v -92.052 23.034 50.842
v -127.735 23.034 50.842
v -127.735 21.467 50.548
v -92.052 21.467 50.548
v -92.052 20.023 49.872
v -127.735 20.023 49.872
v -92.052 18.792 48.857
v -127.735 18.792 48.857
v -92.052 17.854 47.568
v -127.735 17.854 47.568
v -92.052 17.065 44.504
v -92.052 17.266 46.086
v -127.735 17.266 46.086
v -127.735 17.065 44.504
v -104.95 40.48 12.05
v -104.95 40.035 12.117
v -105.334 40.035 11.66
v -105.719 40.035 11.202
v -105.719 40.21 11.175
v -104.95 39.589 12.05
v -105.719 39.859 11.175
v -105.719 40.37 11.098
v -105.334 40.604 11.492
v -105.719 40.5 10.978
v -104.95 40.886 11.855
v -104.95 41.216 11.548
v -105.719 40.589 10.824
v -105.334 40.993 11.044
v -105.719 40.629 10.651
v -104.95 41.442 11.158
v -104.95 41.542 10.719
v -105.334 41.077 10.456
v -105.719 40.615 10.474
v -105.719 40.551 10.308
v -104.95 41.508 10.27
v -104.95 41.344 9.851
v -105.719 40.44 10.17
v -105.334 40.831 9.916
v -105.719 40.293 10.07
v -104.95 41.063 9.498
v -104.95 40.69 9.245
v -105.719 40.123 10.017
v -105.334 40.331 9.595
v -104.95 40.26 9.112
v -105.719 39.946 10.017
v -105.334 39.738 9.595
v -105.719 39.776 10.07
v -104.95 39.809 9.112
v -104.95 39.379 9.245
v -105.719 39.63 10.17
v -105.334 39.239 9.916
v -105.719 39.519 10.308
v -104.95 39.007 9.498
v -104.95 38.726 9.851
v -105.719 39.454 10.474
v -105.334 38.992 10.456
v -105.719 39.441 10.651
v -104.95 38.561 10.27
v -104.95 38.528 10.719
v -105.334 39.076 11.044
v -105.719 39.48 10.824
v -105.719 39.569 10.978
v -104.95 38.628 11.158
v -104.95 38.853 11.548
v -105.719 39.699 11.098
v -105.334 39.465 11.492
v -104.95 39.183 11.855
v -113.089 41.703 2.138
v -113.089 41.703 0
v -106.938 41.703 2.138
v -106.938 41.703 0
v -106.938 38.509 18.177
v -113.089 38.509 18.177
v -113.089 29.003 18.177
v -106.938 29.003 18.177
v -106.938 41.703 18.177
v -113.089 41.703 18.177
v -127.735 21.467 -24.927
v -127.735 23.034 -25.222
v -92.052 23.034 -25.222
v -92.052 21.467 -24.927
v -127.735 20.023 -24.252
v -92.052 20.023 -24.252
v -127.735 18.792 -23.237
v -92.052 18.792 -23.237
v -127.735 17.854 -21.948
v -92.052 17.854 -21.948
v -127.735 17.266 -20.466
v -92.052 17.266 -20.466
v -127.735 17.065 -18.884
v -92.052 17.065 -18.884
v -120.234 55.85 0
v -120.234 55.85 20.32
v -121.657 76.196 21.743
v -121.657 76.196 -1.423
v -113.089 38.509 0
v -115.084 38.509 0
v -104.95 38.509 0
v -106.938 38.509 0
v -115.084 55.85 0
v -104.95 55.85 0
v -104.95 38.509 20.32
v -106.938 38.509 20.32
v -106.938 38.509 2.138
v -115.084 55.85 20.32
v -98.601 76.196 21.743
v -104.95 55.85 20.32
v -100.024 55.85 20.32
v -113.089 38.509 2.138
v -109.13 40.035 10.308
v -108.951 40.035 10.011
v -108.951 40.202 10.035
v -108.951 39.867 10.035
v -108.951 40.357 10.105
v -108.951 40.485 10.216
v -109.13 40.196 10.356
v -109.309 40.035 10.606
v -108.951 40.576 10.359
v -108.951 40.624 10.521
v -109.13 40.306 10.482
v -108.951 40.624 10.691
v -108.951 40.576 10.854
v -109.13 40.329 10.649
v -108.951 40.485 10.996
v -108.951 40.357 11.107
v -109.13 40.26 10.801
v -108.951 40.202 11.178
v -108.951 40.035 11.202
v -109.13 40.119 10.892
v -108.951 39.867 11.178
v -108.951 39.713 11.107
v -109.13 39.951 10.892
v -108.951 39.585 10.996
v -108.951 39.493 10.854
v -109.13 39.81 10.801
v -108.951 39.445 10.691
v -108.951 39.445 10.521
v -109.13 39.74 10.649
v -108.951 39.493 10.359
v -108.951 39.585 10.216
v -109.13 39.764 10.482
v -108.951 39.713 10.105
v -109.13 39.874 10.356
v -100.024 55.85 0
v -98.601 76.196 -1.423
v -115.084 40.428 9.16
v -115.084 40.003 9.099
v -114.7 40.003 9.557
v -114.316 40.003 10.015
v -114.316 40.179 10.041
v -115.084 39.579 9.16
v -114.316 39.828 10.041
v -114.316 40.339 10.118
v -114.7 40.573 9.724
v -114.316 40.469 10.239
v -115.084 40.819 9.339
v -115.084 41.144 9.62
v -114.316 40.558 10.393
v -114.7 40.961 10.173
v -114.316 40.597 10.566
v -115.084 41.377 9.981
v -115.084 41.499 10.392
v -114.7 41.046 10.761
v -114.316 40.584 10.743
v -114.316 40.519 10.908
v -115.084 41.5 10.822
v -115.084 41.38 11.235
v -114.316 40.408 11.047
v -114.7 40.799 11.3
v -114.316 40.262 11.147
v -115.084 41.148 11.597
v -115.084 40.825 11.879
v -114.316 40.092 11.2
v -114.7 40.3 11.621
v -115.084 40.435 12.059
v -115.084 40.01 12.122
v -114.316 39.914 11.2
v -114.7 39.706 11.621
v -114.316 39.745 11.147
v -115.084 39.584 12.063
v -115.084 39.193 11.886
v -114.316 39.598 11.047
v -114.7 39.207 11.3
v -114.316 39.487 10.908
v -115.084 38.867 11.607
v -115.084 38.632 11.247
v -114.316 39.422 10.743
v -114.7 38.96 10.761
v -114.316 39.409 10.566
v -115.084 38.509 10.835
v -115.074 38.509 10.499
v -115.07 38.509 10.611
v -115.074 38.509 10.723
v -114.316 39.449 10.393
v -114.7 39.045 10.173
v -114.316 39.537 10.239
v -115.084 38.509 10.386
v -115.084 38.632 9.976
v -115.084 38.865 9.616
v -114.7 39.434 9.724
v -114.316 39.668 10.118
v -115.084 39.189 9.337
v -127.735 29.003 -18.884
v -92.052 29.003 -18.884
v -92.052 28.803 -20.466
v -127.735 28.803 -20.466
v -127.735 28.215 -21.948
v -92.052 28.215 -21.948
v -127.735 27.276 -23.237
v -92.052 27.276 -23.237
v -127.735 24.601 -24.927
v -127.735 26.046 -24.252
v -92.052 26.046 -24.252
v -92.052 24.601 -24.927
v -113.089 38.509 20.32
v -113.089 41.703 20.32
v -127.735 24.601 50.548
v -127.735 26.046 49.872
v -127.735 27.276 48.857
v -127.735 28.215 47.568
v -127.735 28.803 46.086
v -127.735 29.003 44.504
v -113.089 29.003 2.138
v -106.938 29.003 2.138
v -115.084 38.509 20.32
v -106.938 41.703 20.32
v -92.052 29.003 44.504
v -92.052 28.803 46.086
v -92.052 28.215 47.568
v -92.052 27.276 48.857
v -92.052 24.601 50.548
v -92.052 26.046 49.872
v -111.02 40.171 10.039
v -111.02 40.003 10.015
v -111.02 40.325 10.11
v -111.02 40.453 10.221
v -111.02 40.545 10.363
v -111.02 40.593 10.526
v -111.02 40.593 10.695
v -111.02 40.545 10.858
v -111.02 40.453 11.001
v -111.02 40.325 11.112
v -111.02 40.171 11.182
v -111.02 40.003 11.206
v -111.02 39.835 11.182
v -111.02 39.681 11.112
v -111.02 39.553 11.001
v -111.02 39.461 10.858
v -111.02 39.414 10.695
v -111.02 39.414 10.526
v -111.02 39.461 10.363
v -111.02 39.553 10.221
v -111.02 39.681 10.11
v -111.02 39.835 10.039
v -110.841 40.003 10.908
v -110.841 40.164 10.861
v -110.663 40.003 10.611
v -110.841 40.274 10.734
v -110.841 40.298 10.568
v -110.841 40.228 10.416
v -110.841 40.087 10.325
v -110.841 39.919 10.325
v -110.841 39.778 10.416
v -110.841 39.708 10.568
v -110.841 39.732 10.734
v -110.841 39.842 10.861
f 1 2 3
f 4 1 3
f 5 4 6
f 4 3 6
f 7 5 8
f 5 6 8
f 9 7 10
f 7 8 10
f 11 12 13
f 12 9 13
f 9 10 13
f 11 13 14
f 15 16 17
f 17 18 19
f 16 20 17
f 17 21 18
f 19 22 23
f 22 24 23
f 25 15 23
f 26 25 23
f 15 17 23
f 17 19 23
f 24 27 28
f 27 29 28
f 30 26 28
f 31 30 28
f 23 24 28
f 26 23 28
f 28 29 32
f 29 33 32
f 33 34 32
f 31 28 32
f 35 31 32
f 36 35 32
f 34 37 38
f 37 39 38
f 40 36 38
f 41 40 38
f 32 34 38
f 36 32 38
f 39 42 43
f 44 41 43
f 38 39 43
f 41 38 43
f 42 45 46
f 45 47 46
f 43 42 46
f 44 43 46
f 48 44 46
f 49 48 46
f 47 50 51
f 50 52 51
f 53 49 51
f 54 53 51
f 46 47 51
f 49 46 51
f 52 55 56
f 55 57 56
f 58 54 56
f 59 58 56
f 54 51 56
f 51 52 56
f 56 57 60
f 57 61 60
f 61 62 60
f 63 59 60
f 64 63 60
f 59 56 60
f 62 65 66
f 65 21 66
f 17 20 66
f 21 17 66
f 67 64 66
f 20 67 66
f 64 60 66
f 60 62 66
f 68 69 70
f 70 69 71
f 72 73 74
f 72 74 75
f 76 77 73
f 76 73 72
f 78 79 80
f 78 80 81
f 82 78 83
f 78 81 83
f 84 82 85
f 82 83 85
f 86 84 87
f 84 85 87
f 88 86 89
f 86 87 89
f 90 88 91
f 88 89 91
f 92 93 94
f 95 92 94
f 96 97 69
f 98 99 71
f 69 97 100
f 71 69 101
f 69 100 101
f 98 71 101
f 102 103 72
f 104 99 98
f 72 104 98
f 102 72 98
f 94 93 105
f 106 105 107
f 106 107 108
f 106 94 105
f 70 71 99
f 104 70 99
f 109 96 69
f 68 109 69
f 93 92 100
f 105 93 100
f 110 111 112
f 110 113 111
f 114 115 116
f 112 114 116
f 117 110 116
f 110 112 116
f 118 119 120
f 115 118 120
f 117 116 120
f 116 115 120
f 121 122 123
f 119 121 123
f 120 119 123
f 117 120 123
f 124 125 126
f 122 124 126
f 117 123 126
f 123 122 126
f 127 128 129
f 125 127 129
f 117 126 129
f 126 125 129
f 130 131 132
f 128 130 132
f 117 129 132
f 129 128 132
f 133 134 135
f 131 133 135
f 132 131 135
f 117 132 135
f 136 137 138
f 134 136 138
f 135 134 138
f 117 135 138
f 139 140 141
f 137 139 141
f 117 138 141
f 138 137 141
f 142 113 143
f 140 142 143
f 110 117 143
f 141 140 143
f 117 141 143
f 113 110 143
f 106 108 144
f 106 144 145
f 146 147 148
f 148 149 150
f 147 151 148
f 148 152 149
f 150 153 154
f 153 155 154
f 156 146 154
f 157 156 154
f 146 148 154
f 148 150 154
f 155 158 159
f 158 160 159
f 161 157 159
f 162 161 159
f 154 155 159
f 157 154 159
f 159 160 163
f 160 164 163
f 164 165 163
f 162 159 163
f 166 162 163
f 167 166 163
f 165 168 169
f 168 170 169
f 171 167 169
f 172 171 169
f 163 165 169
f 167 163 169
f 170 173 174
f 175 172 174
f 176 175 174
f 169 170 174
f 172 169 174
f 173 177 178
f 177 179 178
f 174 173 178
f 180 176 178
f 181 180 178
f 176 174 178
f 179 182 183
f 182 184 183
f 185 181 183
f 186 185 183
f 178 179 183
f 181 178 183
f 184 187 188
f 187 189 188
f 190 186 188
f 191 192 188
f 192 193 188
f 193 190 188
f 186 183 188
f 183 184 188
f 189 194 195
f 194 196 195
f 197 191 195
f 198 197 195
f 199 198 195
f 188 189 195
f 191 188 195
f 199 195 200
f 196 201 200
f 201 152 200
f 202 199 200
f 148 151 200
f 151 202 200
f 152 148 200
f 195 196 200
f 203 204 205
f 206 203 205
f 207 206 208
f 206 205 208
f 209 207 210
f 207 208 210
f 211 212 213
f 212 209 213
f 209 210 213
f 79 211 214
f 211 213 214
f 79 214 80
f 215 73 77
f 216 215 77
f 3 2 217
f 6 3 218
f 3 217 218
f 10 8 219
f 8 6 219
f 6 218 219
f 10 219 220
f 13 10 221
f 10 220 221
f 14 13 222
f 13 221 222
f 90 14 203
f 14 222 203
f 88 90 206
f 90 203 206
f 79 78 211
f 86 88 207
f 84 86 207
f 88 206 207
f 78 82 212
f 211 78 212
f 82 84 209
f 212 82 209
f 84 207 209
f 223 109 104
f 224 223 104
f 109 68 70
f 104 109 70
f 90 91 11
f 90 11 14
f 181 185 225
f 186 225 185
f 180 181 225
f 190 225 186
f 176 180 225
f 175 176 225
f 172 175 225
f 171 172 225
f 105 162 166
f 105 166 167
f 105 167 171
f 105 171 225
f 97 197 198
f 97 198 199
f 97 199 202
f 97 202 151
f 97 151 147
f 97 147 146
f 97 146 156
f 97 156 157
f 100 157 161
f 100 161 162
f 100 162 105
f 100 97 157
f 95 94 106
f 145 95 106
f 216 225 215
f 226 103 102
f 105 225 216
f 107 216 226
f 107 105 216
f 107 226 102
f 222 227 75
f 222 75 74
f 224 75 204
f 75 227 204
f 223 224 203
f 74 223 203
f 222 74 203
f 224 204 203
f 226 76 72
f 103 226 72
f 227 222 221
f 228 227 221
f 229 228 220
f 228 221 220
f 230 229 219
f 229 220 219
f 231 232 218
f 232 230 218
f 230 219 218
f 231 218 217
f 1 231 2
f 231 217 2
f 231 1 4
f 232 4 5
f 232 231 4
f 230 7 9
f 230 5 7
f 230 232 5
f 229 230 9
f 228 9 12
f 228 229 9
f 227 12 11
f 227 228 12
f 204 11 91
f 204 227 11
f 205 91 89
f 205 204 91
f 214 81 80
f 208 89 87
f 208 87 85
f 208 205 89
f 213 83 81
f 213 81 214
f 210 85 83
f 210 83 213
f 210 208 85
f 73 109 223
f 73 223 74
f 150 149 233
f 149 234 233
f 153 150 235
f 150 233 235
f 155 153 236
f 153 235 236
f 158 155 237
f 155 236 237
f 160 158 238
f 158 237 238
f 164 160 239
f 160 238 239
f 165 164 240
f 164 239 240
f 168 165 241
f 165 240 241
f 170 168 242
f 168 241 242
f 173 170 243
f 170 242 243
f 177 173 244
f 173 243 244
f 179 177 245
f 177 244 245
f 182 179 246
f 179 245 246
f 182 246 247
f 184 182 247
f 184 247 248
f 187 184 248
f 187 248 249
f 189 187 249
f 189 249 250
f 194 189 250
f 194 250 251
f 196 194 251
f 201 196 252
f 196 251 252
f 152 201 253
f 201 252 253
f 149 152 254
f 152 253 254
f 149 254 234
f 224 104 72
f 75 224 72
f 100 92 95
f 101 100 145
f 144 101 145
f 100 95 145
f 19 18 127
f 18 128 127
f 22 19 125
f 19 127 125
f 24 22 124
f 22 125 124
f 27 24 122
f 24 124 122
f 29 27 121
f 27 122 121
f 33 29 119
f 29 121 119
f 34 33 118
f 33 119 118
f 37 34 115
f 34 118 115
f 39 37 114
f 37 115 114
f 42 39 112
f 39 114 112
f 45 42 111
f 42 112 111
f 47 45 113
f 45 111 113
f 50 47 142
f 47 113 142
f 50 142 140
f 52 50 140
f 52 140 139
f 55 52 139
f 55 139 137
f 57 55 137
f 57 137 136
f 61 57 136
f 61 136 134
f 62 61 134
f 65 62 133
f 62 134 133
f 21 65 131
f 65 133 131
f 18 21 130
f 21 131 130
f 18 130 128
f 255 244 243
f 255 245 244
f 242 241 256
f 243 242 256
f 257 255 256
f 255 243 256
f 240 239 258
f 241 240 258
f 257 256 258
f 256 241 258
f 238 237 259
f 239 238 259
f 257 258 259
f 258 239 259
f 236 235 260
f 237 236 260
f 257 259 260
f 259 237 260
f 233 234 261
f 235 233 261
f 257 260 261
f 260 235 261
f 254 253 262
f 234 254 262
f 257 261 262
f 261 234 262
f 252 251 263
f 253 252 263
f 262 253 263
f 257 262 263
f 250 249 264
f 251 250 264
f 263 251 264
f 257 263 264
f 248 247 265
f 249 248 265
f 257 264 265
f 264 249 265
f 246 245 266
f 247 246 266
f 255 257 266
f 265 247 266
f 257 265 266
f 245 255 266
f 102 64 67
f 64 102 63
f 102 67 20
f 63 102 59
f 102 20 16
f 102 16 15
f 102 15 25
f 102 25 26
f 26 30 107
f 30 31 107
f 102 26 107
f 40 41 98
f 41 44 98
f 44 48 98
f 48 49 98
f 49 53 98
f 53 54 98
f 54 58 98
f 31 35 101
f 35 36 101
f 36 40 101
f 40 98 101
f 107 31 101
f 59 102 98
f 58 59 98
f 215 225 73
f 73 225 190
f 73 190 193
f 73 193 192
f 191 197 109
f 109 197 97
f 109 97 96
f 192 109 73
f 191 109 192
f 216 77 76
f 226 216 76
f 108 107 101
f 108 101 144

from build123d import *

# Parameters (mm, degrees)
SKETCH5_W                       = 20.209666631
SKETCH5_H                       = 20.346218433
BOSS_EXTRUDE3_DEPTH             = 20.32
DRAFT4_ANGLE                    = 4
DRAFT5_ANGLE                    = 4
SKETCH6_W                       = 10.134168445
SKETCH6_H                       = 17.341048708
BOSS_EXTRUDE4_DEPTH             = 20.32
SKETCH7_W                       = 6.151087315
SKETCH7_H                       = 12.30217463
BOSS_EXTRUDE5_DEPTH             = 20.32
CUT_EXTRUDE1_DEPTH              = 20.32
SKETCH9_W                       = 6.151087315
SKETCH9_H                       = 16.039002112
BOSS_EXTRUDE8_DEPTH             = 12.7
F_0_80_TAPPED_HOLE1_D           = 1.19126
F_0_80_TAPPED_HOLE1_DEPTH       = 4.0005
F_0_80_TAPPED_HOLE1_CSINK_D     = 3.0226
F_0_80_TAPPED_HOLE1_CSINK_ANGLE = 100
F_0_80_TAPPED_HOLE1_TIP         = 0.357890611
F_0_80_TAPPED_HOLE3_D           = 1.19126
F_0_80_TAPPED_HOLE3_DEPTH       = 4.064
F_0_80_TAPPED_HOLE3_CSINK_D     = 3.0226
F_0_80_TAPPED_HOLE3_CSINK_ANGLE = 100
F_0_80_TAPPED_HOLE3_TIP         = 0.357890611
SKETCH28_W                      = 35.682781241
SKETCH28_H                      = 76.087494434
BOSS_EXTRUDE13_DEPTH            = 11.938
FILLET5_R                       = 6.35
FILLET6_R                       = 6.35


with BuildPart() as part:
    # Sketch5 → Boss-Extrude3 (new body)
    with BuildSketch(Plane.XY):
        with Locations((-110.129027961, 66.022796056)):
            Rectangle(SKETCH5_W, SKETCH5_H)
    extrude(amount=BOSS_EXTRUDE3_DEPTH)

    # Draft4
    draft4_faces = [part.faces().sort_by_distance(p)[0] for p in [
        (-100.024194645, 66.022796056, 10.16),
        (-120.233861276, 66.022796056, 10.16),
        (-110.129027961, 66.022796056, 20.32),
    ]]
    draft(draft4_faces, Plane(origin=(-120.233861276, 55.849686839, 20.32), x_dir=(0, 0, -1), z_dir=(0, -1, 0)), DRAFT4_ANGLE)

    # Draft5
    draft5_faces = [part.faces().sort_by_distance(p)[0] for p in [
        (-110.129027961, 66.245821761, 0),
    ]]
    draft(draft5_faces, Plane(origin=(-120.233861276, 55.849686839, 20.32), x_dir=(0, 0, -1), z_dir=(0, -1, 0)), DRAFT5_ANGLE)

    # Sketch6 → Boss-Extrude4 (add)
    with BuildSketch(Plane.XY):
        with Locations((-110.017330359, 47.179162485)):
            Rectangle(SKETCH6_W, SKETCH6_H)
    extrude(amount=BOSS_EXTRUDE4_DEPTH)

    # Sketch7 → Boss-Extrude5 (add)
    with BuildSketch(Plane.XY):
        with Locations((-110.013841195, 32.357550816)):
            Rectangle(SKETCH7_W, SKETCH7_H)
    extrude(amount=BOSS_EXTRUDE5_DEPTH)

    # Sketch8 → Cut-Extrude1 (cut)
    with BuildSketch(Plane(origin=(0, 0, 0), x_dir=(-1, 0, 0), z_dir=(0, 0, -1))):
        Polygon((113.089384852, 38.508638131), (113.089384852, 41.703281679), (106.938297537, 41.703281679), (106.938297537, 38.508638131), (106.938297537, 26.206463501), (113.089384852, 26.206463501), align=None)
    extrude(amount=-CUT_EXTRUDE1_DEPTH, mode=Mode.SUBTRACT)

    # Sketch9 → Boss-Extrude8 (add)
    with BuildSketch(Plane.XZ.offset(-41.703281679)):
        with Locations((-110.013841195, 10.15769714)):
            Rectangle(SKETCH9_W, SKETCH9_H)
    extrude(amount=BOSS_EXTRUDE8_DEPTH)

    # #0-80 Tapped Hole1
    with Locations(Plane(origin=(-104.950246136, 0, 0), x_dir=(0, 0, -1), z_dir=(1, 0, 0))):
        with Locations((-10.606199537, 40.03468966)):
            CounterSinkHole(F_0_80_TAPPED_HOLE1_D / 2, F_0_80_TAPPED_HOLE1_CSINK_D / 2, depth=F_0_80_TAPPED_HOLE1_DEPTH, counter_sink_angle=F_0_80_TAPPED_HOLE1_CSINK_ANGLE)
            with Locations((0, 0, -(F_0_80_TAPPED_HOLE1_DEPTH + F_0_80_TAPPED_HOLE1_TIP / 2))):  # 118° drill point
                Cone(0, F_0_80_TAPPED_HOLE1_D / 2, F_0_80_TAPPED_HOLE1_TIP, mode=Mode.SUBTRACT)

    # #0-80 Tapped Hole3
    with Locations(Plane.ZY.offset(115.084414581)):
        with Locations((10.610590501, 40.003135548)):
            CounterSinkHole(F_0_80_TAPPED_HOLE3_D / 2, F_0_80_TAPPED_HOLE3_CSINK_D / 2, depth=F_0_80_TAPPED_HOLE3_DEPTH, counter_sink_angle=F_0_80_TAPPED_HOLE3_CSINK_ANGLE)
            with Locations((0, 0, -(F_0_80_TAPPED_HOLE3_DEPTH + F_0_80_TAPPED_HOLE3_TIP / 2))):  # 118° drill point
                Cone(0, F_0_80_TAPPED_HOLE3_D / 2, F_0_80_TAPPED_HOLE3_TIP, mode=Mode.SUBTRACT)

    # Sketch28 → Boss-Extrude13 (add)
    with BuildSketch(Plane(origin=(0, 29.003281679, 0), x_dir=(-1, 0, 0), z_dir=(0, -1, 0))):
        with Locations((109.89388319, -12.810019293)):
            Rectangle(SKETCH28_W, SKETCH28_H)
    extrude(amount=BOSS_EXTRUDE13_DEPTH)

    # Fillet5
    # the kernel refuses this fillet: 6.35 mm, written as the material it takes off along each edge
    with BuildSketch(Plane(origin=(-76.177492569, 17.065281679, -25.233727924), x_dir=(0, 1, 0), z_dir=(-1, 0, 0))) as fillet5_piece_1:
        with BuildLine():
            CenterArc((FILLET5_R, -FILLET5_R), FILLET5_R, 90, 90)
            Line((0, -FILLET5_R), (0, 0))
            Line((0, 0), (FILLET5_R, 0))
        make_face()
    extrude(amount=67.43278124, mode=Mode.SUBTRACT)
    with BuildSketch(Plane(origin=(-76.177492569, 29.003281679, -25.233727924), x_dir=(0, -1, 0), z_dir=(-1, 0, 0))) as fillet5_piece_2:
        with BuildLine():
            CenterArc((FILLET5_R, FILLET5_R), FILLET5_R, 180, 90)
            Line((0, FILLET5_R), (0, 0))
            Line((0, 0), (FILLET5_R, 0))
        make_face()
    extrude(amount=67.43278124, mode=Mode.SUBTRACT)

    # Fillet6
    # the kernel refuses this fillet: 6.35 mm, written as the material it takes off along each edge
    with BuildSketch(Plane(origin=(-143.61027381, 17.065281679, 50.85376651), x_dir=(0, 1, 0), z_dir=(1, 0, 0)), Plane(origin=(-143.61027381, 29.003281679, 50.85376651), x_dir=(0, 0, -1), z_dir=(1, 0, 0))) as fillet6_piece_1:
        with BuildLine():
            CenterArc((FILLET6_R, -FILLET6_R), FILLET6_R, 90, 90)
            Line((0, -FILLET6_R), (0, 0))
            Line((0, 0), (FILLET6_R, 0))
        make_face()
    extrude(amount=67.43278124, mode=Mode.SUBTRACT)


solid = part.part
